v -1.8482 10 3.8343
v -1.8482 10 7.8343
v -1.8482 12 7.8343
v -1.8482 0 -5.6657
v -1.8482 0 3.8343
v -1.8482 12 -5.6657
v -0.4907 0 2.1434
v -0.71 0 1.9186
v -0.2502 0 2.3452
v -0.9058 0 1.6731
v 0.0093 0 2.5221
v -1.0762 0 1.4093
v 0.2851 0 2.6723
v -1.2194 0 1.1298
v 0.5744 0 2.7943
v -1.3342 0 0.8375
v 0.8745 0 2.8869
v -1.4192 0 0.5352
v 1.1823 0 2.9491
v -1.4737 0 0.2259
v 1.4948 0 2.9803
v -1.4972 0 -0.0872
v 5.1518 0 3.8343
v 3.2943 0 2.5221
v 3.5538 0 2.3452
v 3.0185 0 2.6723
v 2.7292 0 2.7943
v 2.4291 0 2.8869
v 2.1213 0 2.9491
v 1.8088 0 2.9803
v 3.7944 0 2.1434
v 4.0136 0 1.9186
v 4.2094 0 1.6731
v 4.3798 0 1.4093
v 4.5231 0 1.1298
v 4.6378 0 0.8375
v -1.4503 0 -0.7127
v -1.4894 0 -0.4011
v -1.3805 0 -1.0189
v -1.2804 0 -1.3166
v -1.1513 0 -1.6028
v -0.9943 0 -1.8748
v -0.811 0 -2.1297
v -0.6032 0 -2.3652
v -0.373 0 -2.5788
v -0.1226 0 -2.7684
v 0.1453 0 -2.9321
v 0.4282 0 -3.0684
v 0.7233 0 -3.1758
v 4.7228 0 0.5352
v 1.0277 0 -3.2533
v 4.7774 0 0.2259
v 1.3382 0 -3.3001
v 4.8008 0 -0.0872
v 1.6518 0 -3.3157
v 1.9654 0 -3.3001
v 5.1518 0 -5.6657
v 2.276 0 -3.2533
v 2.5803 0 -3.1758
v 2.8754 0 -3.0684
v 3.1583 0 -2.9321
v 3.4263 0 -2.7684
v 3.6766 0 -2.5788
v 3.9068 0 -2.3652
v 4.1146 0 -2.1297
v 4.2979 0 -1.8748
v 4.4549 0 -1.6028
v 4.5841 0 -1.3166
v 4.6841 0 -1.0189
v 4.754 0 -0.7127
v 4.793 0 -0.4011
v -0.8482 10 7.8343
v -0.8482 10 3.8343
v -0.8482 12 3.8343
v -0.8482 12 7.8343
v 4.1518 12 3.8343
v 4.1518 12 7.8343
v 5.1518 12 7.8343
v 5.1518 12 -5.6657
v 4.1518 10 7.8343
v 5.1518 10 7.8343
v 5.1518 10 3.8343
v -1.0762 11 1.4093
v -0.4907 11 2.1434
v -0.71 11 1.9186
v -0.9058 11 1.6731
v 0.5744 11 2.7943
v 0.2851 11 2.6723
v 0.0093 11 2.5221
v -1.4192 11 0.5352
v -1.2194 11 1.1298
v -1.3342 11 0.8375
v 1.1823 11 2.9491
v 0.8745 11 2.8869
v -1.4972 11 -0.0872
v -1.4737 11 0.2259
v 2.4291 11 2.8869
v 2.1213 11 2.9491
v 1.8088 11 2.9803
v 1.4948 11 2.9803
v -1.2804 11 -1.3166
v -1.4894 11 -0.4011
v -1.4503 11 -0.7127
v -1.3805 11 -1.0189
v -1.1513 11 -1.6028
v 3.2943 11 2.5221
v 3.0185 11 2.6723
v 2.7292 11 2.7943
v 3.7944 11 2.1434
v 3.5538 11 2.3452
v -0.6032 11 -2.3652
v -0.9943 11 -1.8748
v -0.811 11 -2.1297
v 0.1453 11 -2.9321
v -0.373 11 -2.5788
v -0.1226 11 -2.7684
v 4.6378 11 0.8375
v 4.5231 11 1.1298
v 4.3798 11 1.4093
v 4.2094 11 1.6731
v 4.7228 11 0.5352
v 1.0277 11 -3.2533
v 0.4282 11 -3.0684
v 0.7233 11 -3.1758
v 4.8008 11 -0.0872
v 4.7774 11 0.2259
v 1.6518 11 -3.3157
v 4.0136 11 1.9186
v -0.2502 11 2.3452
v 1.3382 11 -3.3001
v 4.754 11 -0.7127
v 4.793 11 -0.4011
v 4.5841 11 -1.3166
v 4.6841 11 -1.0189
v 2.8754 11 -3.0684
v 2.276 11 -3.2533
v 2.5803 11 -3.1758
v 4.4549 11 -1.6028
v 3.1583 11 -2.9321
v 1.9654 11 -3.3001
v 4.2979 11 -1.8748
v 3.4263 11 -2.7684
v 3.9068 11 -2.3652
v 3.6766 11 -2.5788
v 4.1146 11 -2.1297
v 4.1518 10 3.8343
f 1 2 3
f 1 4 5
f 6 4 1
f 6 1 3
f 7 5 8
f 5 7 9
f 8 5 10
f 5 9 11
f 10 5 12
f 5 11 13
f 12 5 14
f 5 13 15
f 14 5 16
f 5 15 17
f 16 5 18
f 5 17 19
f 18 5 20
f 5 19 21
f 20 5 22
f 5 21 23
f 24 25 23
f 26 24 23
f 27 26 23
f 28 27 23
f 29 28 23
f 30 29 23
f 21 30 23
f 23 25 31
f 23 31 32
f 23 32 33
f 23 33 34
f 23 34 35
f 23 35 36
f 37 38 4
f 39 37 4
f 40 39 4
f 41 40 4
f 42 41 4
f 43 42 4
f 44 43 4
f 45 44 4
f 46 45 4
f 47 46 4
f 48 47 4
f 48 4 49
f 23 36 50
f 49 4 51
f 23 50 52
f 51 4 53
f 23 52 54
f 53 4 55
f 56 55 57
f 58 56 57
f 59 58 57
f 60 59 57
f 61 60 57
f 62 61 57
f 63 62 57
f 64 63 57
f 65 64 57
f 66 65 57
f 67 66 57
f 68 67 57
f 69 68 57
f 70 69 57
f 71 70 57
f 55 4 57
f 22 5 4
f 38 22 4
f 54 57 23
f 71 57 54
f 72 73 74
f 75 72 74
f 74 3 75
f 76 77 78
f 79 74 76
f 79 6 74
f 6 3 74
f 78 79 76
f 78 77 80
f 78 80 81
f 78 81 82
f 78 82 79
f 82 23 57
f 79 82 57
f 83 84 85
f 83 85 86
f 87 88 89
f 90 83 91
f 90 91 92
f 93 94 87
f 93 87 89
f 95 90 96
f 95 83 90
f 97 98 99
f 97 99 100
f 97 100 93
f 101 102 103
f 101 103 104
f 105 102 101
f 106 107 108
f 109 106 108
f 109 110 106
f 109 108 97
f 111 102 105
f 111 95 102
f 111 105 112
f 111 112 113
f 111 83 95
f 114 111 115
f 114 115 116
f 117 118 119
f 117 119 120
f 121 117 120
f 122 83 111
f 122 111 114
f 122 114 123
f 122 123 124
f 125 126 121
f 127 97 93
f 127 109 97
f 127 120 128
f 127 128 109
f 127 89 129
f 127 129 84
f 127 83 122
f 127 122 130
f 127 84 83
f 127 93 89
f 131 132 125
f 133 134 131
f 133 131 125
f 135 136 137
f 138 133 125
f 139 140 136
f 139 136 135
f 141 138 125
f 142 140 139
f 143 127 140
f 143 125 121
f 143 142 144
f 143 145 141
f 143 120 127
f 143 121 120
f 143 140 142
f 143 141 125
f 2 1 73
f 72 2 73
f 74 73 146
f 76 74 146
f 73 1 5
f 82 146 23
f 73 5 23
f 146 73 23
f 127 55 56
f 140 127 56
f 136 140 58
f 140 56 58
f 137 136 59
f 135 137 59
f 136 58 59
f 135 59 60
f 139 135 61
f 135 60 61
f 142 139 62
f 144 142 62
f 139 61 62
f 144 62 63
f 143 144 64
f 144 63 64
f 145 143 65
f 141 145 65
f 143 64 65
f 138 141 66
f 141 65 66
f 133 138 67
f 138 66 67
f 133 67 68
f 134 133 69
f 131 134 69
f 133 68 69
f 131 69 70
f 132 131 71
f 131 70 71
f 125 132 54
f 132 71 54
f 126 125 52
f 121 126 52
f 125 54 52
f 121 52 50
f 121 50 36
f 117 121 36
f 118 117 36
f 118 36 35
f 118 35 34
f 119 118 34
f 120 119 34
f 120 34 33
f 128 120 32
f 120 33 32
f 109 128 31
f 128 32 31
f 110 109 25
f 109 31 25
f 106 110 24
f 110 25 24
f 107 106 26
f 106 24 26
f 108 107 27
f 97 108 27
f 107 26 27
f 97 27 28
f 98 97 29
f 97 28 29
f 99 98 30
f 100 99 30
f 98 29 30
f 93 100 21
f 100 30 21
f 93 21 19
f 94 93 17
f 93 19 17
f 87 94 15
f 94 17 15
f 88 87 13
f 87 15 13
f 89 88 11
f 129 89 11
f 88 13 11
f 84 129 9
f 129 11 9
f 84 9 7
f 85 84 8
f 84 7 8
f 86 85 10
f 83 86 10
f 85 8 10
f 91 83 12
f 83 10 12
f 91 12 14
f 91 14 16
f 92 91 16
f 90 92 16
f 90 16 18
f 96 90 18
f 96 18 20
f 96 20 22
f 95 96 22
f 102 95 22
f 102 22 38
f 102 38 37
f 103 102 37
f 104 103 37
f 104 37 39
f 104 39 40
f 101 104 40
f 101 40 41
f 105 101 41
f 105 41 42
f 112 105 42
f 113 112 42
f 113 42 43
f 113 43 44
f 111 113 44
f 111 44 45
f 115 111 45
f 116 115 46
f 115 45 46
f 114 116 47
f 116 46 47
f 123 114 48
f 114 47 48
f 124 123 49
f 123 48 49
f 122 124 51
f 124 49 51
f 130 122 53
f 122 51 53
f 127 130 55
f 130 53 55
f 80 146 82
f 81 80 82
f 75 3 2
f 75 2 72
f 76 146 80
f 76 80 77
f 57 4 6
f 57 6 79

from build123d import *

# Parameters (mm, degrees)
SKETCH1_W           = 7
SKETCH1_H           = 9.5
BOSS_EXTRUDE1_DEPTH = 12
SKETCH3_R           = 3.15
CUT_EXTRUDE2_DEPTH  = 11
SKETCH4_W           = 1
SKETCH4_H           = 2
BOSS_EXTRUDE2_DEPTH = 4


with BuildPart() as part:
    # Sketch1 → Boss-Extrude1 (new body)
    with BuildSketch(Plane(origin=(0, 0, 0), x_dir=(1, 0, 0), z_dir=(0, 1, 0))):
        with Locations((1.651810585, 0.915738162)):
            Rectangle(SKETCH1_W, SKETCH1_H)
    extrude(amount=BOSS_EXTRUDE1_DEPTH)

    # Sketch3 → Cut-Extrude2 (cut)
    with BuildSketch(Plane.XZ):
        with Locations(Location((1.651810585, -0.165738162, 0), (0, 0, 270))):
            Circle(SKETCH3_R)
    extrude(amount=-CUT_EXTRUDE2_DEPTH, mode=Mode.SUBTRACT)

    # Sketch4 → Boss-Extrude2 (add)
    with BuildSketch(Plane.XY.offset(3.834261838)):
        with Locations((-1.348189415, 11)):
            Rectangle(SKETCH4_W, SKETCH4_H)
        with Locations((4.651810585, 11)):
            Rectangle(SKETCH4_W, SKETCH4_H)
    extrude(amount=BOSS_EXTRUDE2_DEPTH)


solid = part.part
